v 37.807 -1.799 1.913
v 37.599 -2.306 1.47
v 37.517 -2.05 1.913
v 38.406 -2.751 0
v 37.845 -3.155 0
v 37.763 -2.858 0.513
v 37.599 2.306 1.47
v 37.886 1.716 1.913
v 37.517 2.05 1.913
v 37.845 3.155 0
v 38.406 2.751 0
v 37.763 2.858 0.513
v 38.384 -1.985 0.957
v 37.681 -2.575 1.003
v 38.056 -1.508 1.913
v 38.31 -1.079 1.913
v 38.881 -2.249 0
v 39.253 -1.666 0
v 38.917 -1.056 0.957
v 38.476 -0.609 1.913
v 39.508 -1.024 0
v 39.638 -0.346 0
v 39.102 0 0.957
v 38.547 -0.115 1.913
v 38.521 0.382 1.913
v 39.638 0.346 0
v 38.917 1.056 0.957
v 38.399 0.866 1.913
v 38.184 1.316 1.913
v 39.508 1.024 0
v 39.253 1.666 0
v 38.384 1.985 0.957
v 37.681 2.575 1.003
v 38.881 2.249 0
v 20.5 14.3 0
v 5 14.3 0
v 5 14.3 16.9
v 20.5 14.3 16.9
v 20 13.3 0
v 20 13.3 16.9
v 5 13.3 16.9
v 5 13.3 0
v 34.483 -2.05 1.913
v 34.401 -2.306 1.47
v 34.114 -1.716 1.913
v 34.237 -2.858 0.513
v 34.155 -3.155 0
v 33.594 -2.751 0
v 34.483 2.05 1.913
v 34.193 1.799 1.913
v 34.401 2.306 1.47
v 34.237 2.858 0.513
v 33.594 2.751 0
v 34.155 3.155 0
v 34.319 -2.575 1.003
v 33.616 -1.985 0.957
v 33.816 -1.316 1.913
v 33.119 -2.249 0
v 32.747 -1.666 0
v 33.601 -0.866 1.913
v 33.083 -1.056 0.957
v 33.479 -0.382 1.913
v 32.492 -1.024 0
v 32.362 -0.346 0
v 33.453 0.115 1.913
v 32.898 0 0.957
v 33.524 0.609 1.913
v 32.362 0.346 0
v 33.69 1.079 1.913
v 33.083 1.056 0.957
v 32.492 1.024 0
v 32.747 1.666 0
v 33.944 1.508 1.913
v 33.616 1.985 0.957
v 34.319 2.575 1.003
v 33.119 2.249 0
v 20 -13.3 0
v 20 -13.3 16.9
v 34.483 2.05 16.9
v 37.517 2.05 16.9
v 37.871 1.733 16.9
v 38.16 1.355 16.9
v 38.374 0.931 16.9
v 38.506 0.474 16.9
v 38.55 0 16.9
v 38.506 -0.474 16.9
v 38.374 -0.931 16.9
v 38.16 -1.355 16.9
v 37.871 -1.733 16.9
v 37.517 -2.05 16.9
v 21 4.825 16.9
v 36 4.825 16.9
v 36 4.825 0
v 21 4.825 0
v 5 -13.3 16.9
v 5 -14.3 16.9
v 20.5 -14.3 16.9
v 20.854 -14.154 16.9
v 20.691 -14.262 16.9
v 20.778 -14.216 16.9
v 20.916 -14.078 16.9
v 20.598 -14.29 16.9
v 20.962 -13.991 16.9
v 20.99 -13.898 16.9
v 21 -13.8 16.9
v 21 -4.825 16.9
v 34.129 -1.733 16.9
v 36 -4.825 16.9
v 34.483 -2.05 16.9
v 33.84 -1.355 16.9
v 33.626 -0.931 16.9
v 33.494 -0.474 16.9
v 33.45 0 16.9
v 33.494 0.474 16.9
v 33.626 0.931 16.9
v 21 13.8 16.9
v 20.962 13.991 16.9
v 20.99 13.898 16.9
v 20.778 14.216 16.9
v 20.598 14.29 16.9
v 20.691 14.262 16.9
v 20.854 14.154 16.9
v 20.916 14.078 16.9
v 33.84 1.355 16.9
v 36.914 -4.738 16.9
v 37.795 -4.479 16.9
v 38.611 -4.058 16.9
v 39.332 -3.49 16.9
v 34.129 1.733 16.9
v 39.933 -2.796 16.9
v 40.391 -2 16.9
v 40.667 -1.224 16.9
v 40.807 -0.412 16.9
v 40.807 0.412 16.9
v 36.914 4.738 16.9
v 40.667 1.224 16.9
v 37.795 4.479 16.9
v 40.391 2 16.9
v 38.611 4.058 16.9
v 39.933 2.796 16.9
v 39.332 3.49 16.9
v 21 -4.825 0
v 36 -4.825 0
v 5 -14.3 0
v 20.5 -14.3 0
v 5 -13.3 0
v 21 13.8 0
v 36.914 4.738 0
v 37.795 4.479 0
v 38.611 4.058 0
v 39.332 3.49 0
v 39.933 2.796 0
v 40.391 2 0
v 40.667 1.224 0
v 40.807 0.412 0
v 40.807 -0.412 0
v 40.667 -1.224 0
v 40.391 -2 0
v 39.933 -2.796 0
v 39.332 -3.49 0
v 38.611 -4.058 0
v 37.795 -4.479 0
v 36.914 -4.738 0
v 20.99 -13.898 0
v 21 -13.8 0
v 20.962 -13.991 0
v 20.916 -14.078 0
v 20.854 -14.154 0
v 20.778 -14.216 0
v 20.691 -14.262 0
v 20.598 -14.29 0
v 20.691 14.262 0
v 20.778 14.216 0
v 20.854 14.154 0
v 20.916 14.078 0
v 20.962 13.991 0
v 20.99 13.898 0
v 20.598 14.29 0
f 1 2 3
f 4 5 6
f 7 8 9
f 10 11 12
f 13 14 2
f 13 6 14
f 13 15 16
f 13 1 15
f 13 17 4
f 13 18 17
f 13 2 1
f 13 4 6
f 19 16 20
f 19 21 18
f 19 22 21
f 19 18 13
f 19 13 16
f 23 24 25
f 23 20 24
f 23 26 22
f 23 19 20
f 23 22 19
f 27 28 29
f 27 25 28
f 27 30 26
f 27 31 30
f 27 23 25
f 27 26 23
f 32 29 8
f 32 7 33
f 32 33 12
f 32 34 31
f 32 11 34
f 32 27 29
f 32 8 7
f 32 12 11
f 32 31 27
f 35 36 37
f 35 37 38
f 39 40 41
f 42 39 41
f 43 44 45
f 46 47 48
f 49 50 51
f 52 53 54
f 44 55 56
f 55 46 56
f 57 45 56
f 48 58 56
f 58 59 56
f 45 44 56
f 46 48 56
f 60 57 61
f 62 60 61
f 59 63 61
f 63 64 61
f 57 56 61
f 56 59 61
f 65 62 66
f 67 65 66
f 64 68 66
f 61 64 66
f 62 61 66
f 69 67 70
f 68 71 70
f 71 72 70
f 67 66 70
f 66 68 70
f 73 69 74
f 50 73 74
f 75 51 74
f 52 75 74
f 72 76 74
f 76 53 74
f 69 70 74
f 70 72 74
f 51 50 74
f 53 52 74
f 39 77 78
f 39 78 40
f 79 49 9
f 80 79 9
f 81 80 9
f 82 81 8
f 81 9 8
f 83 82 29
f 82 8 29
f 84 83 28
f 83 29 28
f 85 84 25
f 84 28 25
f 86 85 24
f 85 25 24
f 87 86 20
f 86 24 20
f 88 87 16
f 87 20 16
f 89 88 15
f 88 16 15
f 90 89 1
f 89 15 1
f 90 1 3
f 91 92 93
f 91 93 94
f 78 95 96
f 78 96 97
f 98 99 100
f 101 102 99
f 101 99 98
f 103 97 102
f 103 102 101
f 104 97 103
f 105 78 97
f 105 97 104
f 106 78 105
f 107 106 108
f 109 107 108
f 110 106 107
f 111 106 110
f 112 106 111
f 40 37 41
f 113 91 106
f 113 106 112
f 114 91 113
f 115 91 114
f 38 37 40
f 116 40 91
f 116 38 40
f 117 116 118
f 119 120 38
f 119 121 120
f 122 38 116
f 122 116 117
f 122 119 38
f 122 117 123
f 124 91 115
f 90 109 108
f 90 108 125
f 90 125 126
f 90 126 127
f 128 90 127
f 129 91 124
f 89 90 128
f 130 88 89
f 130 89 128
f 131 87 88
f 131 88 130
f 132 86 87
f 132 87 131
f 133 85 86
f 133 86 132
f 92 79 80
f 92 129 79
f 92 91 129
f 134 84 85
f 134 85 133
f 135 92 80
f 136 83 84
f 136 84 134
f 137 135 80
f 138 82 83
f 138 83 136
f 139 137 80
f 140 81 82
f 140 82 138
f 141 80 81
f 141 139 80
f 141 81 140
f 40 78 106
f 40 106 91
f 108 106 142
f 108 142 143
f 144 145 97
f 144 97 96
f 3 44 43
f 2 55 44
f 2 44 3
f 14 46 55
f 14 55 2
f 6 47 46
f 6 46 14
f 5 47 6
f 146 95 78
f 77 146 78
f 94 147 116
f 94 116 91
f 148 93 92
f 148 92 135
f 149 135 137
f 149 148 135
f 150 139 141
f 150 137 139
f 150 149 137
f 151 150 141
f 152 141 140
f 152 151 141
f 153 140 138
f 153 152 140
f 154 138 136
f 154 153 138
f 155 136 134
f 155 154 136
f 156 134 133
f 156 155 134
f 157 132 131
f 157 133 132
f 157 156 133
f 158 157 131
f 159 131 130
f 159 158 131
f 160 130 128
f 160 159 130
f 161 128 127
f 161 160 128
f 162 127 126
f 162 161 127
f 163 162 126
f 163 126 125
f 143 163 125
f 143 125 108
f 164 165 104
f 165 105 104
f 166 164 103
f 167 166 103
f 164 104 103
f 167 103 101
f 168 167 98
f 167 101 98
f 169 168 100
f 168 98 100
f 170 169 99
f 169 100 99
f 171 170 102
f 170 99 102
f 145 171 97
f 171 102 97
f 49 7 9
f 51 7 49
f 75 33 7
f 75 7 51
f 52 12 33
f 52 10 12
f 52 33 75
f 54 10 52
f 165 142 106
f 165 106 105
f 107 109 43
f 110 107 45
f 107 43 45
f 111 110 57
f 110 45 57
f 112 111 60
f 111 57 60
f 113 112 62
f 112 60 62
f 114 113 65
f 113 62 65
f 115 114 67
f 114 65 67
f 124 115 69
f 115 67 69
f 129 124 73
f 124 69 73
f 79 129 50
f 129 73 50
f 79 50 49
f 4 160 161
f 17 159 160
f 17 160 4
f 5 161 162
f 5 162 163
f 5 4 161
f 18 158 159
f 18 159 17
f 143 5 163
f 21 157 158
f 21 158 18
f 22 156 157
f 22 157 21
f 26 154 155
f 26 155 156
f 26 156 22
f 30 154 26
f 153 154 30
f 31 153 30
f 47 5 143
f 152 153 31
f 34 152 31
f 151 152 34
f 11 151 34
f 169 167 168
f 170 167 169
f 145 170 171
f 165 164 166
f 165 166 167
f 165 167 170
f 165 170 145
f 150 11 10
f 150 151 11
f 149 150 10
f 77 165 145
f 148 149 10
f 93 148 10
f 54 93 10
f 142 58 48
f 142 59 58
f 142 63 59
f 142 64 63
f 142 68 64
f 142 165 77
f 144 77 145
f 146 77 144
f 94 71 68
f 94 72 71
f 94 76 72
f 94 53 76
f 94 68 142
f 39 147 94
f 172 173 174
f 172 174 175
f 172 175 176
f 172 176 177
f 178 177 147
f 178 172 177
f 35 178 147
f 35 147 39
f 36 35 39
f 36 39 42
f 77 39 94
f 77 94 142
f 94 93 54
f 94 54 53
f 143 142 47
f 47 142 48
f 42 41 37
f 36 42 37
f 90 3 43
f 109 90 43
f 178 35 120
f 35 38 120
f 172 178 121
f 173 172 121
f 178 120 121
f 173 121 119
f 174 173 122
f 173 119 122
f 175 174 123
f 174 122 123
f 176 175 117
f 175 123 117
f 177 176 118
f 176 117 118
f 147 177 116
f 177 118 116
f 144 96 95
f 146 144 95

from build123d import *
from OCP.BRepFilletAPI import BRepFilletAPI_MakeChamfer

# Parameters (mm, degrees)
BOSS_EXTRUDE1_DEPTH = 16.9
BOSS_EXTRUDE2_DEPTH = 13.5
BOSS_EXTRUDE3_DEPTH = 3.4
BOSS_EXTRUDE4_DEPTH = 13.5
CUT_EXTRUDE1_DEPTH  = 46.31468443
CHAMFER1_SIZE       = 2
CHAMFER1_SIZE2      = 1.154700538
CUT_EXTRUDE2_DEPTH  = 47.441152279
FILLET1_R           = 0.5
SKETCH10_W          = 25
SKETCH10_H          = 28.6
CUT_EXTRUDE3_DEPTH  = 47.441152315


with BuildPart() as part:
    # Sketch1 → Boss-Extrude1 (new body)
    with BuildSketch(Plane.XY):
        Polygon((-20, -13.3), (20, -13.3), (20, 13.3), (-20, 13.3), (-20, 14.3), (21, 14.3), (21, -14.3), (-20, -14.3), align=None)
    extrude(amount=BOSS_EXTRUDE1_DEPTH)

    # Sketch4 → Boss-Extrude2 (add)
    with BuildSketch(Plane(origin=(0, 0, 0), x_dir=(-1, 0, 0), z_dir=(0, 0, -1))):
        with BuildLine():
            Line((-21, 4.825), (-36, 4.825))
            ThreePointArc((-36, 4.825), (-38.610615349, 4.05774722), (-40.390970849, 2))
            Line((-40.390970849, 2), (-30.875, 2))
            Line((-30.875, 2), (-30.875, -2))
            Line((-30.875, -2), (-40.390970849, -2))
            ThreePointArc((-40.390970849, -2), (-38.610615349, -4.05774722), (-36, -4.825))
            Line((-36, -4.825), (-21, -4.825))
            Line((-21, -4.825), (-21, 4.825))
        make_face()
    extrude(amount=-BOSS_EXTRUDE2_DEPTH)

    # Sketch5 → Boss-Extrude3 (add)
    with BuildSketch(Plane.XY.offset(13.5)):
        with BuildLine():
            Line((21, 4.825), (21, -4.825))
            Line((21, -4.825), (36, -4.825))
            ThreePointArc((36, -4.825), (38.610615349, -4.05774722), (40.390970849, -2))
            ThreePointArc((40.390970849, -2), (40.825, 0), (40.390970849, 2))
            ThreePointArc((40.390970849, 2), (38.610615349, 4.05774722), (36, 4.825))
            Line((36, 4.825), (21, 4.825))
        make_face()
    extrude(amount=BOSS_EXTRUDE3_DEPTH)

    # Sketch8 → Boss-Extrude4 (add)
    with BuildSketch(Plane(origin=(0, 0, 0), x_dir=(-1, 0, 0), z_dir=(0, 0, -1))):
        with BuildLine():
            Line((-37.5, 2), (-40.390970849, 2))
            ThreePointArc((-40.390970849, 2), (-40.825, 0), (-40.390970849, -2))
            Line((-40.390970849, -2), (-37.5, -2))
            ThreePointArc((-37.5, -2), (-38.5, 0), (-37.5, 2))
        make_face()
        with BuildLine():
            Line((-34.5, 2), (-30.875, 2))
            Line((-30.875, 2), (-30.875, -2))
            Line((-30.875, -2), (-34.5, -2))
            ThreePointArc((-34.5, -2), (-33.5, 0), (-34.5, 2))
        make_face()
    extrude(amount=-BOSS_EXTRUDE4_DEPTH)

    # Sketch9 → Cut-Extrude1 (cut, through all)
    with BuildSketch(Plane(origin=(0, 0, 13.5), x_dir=(-1, 0, 0), z_dir=(0, 0, -1))):
        with BuildLine():
            Line((-37.5, -2), (-34.5, -2))
            ThreePointArc((-34.5, -2), (-33.5, 0), (-34.5, 2))
            Line((-34.5, 2), (-37.5, 2))
            ThreePointArc((-37.5, 2), (-38.5, 0), (-37.5, -2))
        make_face()
    extrude(amount=-CUT_EXTRUDE1_DEPTH, mode=Mode.SUBTRACT)

    # Chamfer1: one chamfer whose edges measure the first distance from different faces: ONE call of the kernel's chamfer builder (chamfer() names one face for all edges)
    chamfer1_edges_1 = [part.edges().sort_by_distance(p)[0] for p in [
        (36, 2, 0),
    ]]
    chamfer1_side_1 = [part.faces().sort_by_distance(p)[0] for p in [
        (36, 2, 8.45),
    ]]
    chamfer1_edges_2 = [part.edges().sort_by_distance(p)[0] for p in [
        (38.5, 0, 0),
    ]]
    chamfer1_side_2 = [part.faces().sort_by_distance(p)[0] for p in [
        (38.5, 0, 8.45),
    ]]
    chamfer1_edges_3 = [part.edges().sort_by_distance(p)[0] for p in [
        (36, -2, 0),
    ]]
    chamfer1_side_3 = [part.faces().sort_by_distance(p)[0] for p in [
        (36, -2, 8.45),
    ]]
    chamfer1_edges_4 = [part.edges().sort_by_distance(p)[0] for p in [
        (33.5, 0, 0),
    ]]
    chamfer1_side_4 = [part.faces().sort_by_distance(p)[0] for p in [
        (33.5, 0, 8.45),
    ]]
    chamfer1 = BRepFilletAPI_MakeChamfer(part.part.solid().wrapped)
    for e in chamfer1_edges_1:
        chamfer1.Add(CHAMFER1_SIZE, CHAMFER1_SIZE2, e.wrapped, chamfer1_side_1[0].wrapped)  # the first distance lies on this face
    for e in chamfer1_edges_2:
        chamfer1.Add(CHAMFER1_SIZE, CHAMFER1_SIZE2, e.wrapped, chamfer1_side_2[0].wrapped)  # the first distance lies on this face
    for e in chamfer1_edges_3:
        chamfer1.Add(CHAMFER1_SIZE, CHAMFER1_SIZE2, e.wrapped, chamfer1_side_3[0].wrapped)  # the first distance lies on this face
    for e in chamfer1_edges_4:
        chamfer1.Add(CHAMFER1_SIZE, CHAMFER1_SIZE2, e.wrapped, chamfer1_side_4[0].wrapped)  # the first distance lies on this face
    add(Compound.cast(chamfer1.Shape()), mode=Mode.REPLACE)

    # Sketch11 → Cut-Extrude2 (cut, through all)
    with BuildSketch(Plane(origin=(0, 0, 0), x_dir=(-1, 0, 0), z_dir=(0, 0, -1))):
        with BuildLine():
            Line((-34.483424911, 2.05), (-37.516575089, 2.05))
            ThreePointArc((-37.516575089, 2.05), (-38.55, 0), (-37.516575089, -2.05))
            Line((-37.516575089, -2.05), (-34.483424911, -2.05))
            ThreePointArc((-34.483424911, -2.05), (-33.45, 0), (-34.483424911, 2.05))
        make_face()
    extrude(amount=-CUT_EXTRUDE2_DEPTH, mode=Mode.SUBTRACT)

    # Fillet1
    fillet1_edges = [part.edges().sort_by_distance(p)[0] for p in [
        (-20, 14.3, 8.45),
        (21, 14.3, 8.45),
        (21, -14.3, 8.45),
        (-20, -14.3, 8.45),
    ]]
    fillet(fillet1_edges, radius=FILLET1_R)

    # Sketch10 → Cut-Extrude3 (cut, through all)
    with BuildSketch(Plane(origin=(0, 0, 0), x_dir=(-1, 0, 0), z_dir=(0, 0, -1))):
        with Locations((7.5, 0)):
            Rectangle(SKETCH10_W, SKETCH10_H)
    extrude(amount=-CUT_EXTRUDE3_DEPTH, mode=Mode.SUBTRACT)


solid = part.part
